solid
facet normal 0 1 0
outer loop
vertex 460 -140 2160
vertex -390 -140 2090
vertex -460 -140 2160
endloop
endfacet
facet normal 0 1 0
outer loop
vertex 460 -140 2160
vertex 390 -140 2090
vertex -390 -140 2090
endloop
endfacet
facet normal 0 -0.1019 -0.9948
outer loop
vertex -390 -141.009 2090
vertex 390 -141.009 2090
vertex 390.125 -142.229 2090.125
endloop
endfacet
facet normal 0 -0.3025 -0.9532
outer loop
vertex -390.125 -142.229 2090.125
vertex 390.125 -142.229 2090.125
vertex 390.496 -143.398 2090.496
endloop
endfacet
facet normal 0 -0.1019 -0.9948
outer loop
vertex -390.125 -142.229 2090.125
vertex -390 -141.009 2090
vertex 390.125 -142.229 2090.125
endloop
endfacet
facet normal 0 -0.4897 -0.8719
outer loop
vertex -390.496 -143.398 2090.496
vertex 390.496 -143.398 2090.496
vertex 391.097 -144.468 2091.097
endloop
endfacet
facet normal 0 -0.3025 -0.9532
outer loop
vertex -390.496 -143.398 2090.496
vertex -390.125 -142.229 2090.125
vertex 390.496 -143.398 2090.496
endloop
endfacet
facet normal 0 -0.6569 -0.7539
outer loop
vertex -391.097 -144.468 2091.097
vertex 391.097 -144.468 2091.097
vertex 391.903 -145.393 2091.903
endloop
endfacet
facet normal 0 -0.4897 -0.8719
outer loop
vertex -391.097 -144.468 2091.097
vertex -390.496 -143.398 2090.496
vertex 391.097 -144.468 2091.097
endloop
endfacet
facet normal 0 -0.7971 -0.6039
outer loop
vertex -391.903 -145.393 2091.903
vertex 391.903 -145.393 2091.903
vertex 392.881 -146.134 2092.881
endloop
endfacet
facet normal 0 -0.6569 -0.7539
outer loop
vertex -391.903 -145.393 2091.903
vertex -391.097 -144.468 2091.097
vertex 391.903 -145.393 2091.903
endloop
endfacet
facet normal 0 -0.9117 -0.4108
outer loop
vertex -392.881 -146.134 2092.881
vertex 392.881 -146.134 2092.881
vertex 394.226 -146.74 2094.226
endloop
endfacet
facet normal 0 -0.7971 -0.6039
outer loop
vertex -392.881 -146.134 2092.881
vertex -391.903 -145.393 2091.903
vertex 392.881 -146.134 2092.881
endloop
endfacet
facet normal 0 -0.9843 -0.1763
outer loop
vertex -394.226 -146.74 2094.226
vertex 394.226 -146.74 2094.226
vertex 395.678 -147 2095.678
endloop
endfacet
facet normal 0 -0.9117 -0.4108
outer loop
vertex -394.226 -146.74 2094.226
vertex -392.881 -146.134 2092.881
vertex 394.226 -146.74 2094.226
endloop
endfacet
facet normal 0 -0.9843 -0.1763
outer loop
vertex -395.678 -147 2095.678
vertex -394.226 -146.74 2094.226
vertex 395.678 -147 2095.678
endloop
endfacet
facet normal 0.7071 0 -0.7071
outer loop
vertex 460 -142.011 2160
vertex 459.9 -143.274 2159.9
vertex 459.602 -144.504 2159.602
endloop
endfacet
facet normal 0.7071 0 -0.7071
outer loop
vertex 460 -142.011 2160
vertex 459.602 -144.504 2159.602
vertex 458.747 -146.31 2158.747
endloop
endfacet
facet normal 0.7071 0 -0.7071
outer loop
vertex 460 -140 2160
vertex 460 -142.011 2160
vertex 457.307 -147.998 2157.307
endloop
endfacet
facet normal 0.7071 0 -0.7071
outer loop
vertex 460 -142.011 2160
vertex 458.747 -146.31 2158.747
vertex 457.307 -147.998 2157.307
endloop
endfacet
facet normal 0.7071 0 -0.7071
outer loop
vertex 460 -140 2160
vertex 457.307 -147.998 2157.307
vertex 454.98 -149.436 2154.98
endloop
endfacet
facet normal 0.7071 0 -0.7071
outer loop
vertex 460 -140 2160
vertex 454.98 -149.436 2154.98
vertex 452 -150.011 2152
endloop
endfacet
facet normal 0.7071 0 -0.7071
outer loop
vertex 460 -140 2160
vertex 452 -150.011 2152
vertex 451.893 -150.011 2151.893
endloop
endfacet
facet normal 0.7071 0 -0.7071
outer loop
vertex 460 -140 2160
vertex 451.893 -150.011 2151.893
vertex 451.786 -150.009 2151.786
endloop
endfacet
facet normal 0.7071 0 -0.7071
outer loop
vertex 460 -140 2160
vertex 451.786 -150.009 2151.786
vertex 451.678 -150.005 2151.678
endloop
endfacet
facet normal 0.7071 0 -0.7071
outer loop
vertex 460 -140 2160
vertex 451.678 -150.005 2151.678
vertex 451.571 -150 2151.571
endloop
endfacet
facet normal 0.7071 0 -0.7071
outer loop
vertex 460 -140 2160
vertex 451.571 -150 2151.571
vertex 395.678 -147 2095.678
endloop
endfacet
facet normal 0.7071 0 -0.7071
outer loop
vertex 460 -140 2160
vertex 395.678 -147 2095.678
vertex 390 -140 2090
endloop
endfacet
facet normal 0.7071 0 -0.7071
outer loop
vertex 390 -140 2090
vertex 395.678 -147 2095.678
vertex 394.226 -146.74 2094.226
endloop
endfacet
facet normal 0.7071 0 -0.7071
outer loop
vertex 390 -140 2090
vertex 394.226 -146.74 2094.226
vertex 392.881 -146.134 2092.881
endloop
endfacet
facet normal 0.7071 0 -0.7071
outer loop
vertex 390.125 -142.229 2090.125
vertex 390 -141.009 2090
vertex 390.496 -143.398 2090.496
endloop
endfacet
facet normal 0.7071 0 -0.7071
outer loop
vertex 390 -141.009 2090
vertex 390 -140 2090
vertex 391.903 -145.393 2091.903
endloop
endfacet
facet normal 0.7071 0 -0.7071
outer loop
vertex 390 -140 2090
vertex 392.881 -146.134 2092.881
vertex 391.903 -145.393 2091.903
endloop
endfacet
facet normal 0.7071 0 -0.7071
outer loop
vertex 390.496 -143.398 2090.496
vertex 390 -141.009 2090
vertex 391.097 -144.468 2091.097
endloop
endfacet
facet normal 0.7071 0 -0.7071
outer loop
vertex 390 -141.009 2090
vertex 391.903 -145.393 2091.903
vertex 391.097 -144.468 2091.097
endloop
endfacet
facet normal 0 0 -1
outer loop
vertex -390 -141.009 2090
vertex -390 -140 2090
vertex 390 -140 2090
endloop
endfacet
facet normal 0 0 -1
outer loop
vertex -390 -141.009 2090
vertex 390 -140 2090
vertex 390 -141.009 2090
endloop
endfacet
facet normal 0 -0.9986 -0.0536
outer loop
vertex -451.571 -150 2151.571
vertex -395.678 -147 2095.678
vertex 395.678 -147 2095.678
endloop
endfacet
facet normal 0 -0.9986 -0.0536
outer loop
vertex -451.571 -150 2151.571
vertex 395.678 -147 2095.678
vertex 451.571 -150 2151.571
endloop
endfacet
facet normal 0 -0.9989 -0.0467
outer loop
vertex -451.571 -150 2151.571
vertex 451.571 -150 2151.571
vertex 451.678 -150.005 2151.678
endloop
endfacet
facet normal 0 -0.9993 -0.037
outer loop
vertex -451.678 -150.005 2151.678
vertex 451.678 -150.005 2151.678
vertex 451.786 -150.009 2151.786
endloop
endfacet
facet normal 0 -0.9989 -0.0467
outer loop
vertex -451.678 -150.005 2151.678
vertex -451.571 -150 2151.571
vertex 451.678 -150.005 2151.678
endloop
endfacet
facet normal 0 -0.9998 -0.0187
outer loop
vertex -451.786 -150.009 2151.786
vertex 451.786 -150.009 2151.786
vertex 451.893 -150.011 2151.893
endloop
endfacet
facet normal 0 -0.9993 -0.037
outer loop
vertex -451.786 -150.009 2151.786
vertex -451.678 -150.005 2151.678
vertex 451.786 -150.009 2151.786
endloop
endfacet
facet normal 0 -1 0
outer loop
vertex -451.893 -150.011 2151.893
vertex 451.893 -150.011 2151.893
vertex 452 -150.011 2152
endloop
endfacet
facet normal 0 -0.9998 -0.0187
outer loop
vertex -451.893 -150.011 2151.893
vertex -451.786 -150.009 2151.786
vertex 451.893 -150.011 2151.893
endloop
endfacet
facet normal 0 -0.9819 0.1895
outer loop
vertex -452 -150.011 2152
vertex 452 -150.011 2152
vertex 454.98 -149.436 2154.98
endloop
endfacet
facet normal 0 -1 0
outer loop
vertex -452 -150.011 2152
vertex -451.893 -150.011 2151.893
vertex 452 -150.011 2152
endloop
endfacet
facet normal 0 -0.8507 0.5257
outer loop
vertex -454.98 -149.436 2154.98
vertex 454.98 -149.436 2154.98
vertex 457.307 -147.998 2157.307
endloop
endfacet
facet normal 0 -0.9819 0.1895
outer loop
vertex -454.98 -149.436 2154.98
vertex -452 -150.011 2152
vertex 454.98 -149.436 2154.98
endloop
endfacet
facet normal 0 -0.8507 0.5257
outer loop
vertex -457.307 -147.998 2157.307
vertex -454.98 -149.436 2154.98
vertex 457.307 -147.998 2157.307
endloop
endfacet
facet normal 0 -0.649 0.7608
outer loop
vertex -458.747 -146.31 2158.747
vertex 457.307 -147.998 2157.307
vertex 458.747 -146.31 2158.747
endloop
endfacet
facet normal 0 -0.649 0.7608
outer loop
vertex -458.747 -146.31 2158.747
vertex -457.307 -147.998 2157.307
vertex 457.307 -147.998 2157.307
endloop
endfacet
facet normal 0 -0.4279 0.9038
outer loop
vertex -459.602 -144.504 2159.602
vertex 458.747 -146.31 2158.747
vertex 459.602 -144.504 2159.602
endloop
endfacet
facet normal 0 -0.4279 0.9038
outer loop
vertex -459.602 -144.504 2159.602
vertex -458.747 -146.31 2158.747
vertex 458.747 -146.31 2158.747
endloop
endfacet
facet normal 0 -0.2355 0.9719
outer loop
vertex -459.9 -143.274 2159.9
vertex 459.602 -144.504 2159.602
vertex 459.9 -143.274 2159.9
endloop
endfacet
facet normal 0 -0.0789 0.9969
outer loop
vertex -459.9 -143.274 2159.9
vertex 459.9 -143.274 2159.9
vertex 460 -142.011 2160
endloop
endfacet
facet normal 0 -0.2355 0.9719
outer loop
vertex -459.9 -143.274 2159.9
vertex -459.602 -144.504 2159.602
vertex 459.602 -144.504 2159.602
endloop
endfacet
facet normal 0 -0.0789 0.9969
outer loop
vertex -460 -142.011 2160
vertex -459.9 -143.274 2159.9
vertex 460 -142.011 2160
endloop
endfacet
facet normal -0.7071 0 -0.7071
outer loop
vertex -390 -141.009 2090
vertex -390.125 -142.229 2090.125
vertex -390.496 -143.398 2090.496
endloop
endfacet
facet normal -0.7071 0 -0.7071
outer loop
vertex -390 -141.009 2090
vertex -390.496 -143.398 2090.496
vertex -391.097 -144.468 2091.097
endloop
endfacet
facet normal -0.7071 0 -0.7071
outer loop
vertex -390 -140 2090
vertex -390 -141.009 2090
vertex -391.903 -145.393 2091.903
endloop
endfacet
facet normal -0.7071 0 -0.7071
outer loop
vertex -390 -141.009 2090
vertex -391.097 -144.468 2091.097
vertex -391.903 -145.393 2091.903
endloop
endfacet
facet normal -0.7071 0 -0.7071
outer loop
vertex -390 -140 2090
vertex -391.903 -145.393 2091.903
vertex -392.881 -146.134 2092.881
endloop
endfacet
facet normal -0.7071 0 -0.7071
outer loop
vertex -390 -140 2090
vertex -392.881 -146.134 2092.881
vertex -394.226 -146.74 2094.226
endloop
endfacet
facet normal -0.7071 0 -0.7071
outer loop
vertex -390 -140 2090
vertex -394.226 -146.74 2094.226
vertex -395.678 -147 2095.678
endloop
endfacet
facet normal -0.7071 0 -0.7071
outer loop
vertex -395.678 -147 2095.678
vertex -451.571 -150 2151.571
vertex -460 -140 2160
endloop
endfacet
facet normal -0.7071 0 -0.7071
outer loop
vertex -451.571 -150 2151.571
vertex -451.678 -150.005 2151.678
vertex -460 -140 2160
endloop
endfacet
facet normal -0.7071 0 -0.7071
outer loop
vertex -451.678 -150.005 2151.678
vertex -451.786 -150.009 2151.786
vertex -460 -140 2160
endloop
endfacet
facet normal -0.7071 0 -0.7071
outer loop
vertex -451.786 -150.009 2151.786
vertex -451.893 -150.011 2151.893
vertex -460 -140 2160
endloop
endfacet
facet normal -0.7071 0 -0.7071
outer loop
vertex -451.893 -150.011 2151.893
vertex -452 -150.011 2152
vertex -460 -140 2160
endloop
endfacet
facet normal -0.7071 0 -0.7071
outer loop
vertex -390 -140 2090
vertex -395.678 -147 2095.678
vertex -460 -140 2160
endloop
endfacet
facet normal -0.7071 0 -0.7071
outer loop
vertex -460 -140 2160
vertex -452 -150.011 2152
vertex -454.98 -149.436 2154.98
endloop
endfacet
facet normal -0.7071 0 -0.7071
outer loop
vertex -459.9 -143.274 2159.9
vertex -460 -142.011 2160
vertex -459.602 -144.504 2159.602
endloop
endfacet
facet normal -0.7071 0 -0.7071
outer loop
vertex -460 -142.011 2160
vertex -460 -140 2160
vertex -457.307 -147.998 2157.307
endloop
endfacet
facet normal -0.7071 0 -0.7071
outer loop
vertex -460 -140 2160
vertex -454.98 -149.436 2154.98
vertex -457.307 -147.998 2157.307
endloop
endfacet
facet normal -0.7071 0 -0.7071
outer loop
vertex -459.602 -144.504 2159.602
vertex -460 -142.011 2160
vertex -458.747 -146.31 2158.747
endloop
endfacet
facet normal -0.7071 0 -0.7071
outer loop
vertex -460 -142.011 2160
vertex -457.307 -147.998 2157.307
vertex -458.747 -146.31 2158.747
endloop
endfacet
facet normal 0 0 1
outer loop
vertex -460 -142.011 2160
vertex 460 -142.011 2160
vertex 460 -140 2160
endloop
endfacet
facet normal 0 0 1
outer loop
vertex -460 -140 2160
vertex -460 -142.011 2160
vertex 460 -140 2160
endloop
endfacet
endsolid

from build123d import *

# Parameters (mm, degrees)
EXTRUDE039434_DEPTH = 500


with BuildPart() as extrude039434_internal_superior:
    # Sketch223 (on Sketch) → Extrude039434 (new body, symmetric)
    with BuildSketch(Plane.XZ):
        Polygon((-600, 2300), (600, 2300), (200, 1900), (-200, 1900), align=None)
    extrude(amount=EXTRUDE039434_DEPTH, both=True)


with BuildPart() as external_trim_horizontal:
    # Sweep011: sweep along a path in Sketch194
    with BuildLine(Plane.XZ.offset(140)) as sweep011_path:
        Line((-390, 2090), (-390, 0))
        Line((-390, 0), (390, 0))
        Line((390, 0), (390, 2090))
        Line((390, 2090), (-390, 2090))
    # Clone2D027 (on Sketch) → Sweep011 (sweep)
    with BuildSketch(Plane(origin=(0, -140, 0), x_dir=(0, 0, 1), z_dir=(1, 0, 0))):
        with BuildLine():
            Line((-61.571224, 10), (-5.678418, 7))
            ThreePointArc((-5.678418, 7), (-1.645147, 5.136003), (0, 1.008624))
            Line((0, 1.008624), (0, 0))
            Line((0, 0), (-70, 0))
            Line((-70, 0), (-70, 2.011499))
            ThreePointArc((-70, 2.011499), (-67.503171, 7.81797), (-61.571224, 10))
        make_face()
    sweep(path=sweep011_path.line, is_frenet=True, transition=Transition.RIGHT)

    # Common: intersect Extrude039434_Internal_superior_
    add(extrude039434_internal_superior.part, mode=Mode.INTERSECT)


solid = external_trim_horizontal.part
